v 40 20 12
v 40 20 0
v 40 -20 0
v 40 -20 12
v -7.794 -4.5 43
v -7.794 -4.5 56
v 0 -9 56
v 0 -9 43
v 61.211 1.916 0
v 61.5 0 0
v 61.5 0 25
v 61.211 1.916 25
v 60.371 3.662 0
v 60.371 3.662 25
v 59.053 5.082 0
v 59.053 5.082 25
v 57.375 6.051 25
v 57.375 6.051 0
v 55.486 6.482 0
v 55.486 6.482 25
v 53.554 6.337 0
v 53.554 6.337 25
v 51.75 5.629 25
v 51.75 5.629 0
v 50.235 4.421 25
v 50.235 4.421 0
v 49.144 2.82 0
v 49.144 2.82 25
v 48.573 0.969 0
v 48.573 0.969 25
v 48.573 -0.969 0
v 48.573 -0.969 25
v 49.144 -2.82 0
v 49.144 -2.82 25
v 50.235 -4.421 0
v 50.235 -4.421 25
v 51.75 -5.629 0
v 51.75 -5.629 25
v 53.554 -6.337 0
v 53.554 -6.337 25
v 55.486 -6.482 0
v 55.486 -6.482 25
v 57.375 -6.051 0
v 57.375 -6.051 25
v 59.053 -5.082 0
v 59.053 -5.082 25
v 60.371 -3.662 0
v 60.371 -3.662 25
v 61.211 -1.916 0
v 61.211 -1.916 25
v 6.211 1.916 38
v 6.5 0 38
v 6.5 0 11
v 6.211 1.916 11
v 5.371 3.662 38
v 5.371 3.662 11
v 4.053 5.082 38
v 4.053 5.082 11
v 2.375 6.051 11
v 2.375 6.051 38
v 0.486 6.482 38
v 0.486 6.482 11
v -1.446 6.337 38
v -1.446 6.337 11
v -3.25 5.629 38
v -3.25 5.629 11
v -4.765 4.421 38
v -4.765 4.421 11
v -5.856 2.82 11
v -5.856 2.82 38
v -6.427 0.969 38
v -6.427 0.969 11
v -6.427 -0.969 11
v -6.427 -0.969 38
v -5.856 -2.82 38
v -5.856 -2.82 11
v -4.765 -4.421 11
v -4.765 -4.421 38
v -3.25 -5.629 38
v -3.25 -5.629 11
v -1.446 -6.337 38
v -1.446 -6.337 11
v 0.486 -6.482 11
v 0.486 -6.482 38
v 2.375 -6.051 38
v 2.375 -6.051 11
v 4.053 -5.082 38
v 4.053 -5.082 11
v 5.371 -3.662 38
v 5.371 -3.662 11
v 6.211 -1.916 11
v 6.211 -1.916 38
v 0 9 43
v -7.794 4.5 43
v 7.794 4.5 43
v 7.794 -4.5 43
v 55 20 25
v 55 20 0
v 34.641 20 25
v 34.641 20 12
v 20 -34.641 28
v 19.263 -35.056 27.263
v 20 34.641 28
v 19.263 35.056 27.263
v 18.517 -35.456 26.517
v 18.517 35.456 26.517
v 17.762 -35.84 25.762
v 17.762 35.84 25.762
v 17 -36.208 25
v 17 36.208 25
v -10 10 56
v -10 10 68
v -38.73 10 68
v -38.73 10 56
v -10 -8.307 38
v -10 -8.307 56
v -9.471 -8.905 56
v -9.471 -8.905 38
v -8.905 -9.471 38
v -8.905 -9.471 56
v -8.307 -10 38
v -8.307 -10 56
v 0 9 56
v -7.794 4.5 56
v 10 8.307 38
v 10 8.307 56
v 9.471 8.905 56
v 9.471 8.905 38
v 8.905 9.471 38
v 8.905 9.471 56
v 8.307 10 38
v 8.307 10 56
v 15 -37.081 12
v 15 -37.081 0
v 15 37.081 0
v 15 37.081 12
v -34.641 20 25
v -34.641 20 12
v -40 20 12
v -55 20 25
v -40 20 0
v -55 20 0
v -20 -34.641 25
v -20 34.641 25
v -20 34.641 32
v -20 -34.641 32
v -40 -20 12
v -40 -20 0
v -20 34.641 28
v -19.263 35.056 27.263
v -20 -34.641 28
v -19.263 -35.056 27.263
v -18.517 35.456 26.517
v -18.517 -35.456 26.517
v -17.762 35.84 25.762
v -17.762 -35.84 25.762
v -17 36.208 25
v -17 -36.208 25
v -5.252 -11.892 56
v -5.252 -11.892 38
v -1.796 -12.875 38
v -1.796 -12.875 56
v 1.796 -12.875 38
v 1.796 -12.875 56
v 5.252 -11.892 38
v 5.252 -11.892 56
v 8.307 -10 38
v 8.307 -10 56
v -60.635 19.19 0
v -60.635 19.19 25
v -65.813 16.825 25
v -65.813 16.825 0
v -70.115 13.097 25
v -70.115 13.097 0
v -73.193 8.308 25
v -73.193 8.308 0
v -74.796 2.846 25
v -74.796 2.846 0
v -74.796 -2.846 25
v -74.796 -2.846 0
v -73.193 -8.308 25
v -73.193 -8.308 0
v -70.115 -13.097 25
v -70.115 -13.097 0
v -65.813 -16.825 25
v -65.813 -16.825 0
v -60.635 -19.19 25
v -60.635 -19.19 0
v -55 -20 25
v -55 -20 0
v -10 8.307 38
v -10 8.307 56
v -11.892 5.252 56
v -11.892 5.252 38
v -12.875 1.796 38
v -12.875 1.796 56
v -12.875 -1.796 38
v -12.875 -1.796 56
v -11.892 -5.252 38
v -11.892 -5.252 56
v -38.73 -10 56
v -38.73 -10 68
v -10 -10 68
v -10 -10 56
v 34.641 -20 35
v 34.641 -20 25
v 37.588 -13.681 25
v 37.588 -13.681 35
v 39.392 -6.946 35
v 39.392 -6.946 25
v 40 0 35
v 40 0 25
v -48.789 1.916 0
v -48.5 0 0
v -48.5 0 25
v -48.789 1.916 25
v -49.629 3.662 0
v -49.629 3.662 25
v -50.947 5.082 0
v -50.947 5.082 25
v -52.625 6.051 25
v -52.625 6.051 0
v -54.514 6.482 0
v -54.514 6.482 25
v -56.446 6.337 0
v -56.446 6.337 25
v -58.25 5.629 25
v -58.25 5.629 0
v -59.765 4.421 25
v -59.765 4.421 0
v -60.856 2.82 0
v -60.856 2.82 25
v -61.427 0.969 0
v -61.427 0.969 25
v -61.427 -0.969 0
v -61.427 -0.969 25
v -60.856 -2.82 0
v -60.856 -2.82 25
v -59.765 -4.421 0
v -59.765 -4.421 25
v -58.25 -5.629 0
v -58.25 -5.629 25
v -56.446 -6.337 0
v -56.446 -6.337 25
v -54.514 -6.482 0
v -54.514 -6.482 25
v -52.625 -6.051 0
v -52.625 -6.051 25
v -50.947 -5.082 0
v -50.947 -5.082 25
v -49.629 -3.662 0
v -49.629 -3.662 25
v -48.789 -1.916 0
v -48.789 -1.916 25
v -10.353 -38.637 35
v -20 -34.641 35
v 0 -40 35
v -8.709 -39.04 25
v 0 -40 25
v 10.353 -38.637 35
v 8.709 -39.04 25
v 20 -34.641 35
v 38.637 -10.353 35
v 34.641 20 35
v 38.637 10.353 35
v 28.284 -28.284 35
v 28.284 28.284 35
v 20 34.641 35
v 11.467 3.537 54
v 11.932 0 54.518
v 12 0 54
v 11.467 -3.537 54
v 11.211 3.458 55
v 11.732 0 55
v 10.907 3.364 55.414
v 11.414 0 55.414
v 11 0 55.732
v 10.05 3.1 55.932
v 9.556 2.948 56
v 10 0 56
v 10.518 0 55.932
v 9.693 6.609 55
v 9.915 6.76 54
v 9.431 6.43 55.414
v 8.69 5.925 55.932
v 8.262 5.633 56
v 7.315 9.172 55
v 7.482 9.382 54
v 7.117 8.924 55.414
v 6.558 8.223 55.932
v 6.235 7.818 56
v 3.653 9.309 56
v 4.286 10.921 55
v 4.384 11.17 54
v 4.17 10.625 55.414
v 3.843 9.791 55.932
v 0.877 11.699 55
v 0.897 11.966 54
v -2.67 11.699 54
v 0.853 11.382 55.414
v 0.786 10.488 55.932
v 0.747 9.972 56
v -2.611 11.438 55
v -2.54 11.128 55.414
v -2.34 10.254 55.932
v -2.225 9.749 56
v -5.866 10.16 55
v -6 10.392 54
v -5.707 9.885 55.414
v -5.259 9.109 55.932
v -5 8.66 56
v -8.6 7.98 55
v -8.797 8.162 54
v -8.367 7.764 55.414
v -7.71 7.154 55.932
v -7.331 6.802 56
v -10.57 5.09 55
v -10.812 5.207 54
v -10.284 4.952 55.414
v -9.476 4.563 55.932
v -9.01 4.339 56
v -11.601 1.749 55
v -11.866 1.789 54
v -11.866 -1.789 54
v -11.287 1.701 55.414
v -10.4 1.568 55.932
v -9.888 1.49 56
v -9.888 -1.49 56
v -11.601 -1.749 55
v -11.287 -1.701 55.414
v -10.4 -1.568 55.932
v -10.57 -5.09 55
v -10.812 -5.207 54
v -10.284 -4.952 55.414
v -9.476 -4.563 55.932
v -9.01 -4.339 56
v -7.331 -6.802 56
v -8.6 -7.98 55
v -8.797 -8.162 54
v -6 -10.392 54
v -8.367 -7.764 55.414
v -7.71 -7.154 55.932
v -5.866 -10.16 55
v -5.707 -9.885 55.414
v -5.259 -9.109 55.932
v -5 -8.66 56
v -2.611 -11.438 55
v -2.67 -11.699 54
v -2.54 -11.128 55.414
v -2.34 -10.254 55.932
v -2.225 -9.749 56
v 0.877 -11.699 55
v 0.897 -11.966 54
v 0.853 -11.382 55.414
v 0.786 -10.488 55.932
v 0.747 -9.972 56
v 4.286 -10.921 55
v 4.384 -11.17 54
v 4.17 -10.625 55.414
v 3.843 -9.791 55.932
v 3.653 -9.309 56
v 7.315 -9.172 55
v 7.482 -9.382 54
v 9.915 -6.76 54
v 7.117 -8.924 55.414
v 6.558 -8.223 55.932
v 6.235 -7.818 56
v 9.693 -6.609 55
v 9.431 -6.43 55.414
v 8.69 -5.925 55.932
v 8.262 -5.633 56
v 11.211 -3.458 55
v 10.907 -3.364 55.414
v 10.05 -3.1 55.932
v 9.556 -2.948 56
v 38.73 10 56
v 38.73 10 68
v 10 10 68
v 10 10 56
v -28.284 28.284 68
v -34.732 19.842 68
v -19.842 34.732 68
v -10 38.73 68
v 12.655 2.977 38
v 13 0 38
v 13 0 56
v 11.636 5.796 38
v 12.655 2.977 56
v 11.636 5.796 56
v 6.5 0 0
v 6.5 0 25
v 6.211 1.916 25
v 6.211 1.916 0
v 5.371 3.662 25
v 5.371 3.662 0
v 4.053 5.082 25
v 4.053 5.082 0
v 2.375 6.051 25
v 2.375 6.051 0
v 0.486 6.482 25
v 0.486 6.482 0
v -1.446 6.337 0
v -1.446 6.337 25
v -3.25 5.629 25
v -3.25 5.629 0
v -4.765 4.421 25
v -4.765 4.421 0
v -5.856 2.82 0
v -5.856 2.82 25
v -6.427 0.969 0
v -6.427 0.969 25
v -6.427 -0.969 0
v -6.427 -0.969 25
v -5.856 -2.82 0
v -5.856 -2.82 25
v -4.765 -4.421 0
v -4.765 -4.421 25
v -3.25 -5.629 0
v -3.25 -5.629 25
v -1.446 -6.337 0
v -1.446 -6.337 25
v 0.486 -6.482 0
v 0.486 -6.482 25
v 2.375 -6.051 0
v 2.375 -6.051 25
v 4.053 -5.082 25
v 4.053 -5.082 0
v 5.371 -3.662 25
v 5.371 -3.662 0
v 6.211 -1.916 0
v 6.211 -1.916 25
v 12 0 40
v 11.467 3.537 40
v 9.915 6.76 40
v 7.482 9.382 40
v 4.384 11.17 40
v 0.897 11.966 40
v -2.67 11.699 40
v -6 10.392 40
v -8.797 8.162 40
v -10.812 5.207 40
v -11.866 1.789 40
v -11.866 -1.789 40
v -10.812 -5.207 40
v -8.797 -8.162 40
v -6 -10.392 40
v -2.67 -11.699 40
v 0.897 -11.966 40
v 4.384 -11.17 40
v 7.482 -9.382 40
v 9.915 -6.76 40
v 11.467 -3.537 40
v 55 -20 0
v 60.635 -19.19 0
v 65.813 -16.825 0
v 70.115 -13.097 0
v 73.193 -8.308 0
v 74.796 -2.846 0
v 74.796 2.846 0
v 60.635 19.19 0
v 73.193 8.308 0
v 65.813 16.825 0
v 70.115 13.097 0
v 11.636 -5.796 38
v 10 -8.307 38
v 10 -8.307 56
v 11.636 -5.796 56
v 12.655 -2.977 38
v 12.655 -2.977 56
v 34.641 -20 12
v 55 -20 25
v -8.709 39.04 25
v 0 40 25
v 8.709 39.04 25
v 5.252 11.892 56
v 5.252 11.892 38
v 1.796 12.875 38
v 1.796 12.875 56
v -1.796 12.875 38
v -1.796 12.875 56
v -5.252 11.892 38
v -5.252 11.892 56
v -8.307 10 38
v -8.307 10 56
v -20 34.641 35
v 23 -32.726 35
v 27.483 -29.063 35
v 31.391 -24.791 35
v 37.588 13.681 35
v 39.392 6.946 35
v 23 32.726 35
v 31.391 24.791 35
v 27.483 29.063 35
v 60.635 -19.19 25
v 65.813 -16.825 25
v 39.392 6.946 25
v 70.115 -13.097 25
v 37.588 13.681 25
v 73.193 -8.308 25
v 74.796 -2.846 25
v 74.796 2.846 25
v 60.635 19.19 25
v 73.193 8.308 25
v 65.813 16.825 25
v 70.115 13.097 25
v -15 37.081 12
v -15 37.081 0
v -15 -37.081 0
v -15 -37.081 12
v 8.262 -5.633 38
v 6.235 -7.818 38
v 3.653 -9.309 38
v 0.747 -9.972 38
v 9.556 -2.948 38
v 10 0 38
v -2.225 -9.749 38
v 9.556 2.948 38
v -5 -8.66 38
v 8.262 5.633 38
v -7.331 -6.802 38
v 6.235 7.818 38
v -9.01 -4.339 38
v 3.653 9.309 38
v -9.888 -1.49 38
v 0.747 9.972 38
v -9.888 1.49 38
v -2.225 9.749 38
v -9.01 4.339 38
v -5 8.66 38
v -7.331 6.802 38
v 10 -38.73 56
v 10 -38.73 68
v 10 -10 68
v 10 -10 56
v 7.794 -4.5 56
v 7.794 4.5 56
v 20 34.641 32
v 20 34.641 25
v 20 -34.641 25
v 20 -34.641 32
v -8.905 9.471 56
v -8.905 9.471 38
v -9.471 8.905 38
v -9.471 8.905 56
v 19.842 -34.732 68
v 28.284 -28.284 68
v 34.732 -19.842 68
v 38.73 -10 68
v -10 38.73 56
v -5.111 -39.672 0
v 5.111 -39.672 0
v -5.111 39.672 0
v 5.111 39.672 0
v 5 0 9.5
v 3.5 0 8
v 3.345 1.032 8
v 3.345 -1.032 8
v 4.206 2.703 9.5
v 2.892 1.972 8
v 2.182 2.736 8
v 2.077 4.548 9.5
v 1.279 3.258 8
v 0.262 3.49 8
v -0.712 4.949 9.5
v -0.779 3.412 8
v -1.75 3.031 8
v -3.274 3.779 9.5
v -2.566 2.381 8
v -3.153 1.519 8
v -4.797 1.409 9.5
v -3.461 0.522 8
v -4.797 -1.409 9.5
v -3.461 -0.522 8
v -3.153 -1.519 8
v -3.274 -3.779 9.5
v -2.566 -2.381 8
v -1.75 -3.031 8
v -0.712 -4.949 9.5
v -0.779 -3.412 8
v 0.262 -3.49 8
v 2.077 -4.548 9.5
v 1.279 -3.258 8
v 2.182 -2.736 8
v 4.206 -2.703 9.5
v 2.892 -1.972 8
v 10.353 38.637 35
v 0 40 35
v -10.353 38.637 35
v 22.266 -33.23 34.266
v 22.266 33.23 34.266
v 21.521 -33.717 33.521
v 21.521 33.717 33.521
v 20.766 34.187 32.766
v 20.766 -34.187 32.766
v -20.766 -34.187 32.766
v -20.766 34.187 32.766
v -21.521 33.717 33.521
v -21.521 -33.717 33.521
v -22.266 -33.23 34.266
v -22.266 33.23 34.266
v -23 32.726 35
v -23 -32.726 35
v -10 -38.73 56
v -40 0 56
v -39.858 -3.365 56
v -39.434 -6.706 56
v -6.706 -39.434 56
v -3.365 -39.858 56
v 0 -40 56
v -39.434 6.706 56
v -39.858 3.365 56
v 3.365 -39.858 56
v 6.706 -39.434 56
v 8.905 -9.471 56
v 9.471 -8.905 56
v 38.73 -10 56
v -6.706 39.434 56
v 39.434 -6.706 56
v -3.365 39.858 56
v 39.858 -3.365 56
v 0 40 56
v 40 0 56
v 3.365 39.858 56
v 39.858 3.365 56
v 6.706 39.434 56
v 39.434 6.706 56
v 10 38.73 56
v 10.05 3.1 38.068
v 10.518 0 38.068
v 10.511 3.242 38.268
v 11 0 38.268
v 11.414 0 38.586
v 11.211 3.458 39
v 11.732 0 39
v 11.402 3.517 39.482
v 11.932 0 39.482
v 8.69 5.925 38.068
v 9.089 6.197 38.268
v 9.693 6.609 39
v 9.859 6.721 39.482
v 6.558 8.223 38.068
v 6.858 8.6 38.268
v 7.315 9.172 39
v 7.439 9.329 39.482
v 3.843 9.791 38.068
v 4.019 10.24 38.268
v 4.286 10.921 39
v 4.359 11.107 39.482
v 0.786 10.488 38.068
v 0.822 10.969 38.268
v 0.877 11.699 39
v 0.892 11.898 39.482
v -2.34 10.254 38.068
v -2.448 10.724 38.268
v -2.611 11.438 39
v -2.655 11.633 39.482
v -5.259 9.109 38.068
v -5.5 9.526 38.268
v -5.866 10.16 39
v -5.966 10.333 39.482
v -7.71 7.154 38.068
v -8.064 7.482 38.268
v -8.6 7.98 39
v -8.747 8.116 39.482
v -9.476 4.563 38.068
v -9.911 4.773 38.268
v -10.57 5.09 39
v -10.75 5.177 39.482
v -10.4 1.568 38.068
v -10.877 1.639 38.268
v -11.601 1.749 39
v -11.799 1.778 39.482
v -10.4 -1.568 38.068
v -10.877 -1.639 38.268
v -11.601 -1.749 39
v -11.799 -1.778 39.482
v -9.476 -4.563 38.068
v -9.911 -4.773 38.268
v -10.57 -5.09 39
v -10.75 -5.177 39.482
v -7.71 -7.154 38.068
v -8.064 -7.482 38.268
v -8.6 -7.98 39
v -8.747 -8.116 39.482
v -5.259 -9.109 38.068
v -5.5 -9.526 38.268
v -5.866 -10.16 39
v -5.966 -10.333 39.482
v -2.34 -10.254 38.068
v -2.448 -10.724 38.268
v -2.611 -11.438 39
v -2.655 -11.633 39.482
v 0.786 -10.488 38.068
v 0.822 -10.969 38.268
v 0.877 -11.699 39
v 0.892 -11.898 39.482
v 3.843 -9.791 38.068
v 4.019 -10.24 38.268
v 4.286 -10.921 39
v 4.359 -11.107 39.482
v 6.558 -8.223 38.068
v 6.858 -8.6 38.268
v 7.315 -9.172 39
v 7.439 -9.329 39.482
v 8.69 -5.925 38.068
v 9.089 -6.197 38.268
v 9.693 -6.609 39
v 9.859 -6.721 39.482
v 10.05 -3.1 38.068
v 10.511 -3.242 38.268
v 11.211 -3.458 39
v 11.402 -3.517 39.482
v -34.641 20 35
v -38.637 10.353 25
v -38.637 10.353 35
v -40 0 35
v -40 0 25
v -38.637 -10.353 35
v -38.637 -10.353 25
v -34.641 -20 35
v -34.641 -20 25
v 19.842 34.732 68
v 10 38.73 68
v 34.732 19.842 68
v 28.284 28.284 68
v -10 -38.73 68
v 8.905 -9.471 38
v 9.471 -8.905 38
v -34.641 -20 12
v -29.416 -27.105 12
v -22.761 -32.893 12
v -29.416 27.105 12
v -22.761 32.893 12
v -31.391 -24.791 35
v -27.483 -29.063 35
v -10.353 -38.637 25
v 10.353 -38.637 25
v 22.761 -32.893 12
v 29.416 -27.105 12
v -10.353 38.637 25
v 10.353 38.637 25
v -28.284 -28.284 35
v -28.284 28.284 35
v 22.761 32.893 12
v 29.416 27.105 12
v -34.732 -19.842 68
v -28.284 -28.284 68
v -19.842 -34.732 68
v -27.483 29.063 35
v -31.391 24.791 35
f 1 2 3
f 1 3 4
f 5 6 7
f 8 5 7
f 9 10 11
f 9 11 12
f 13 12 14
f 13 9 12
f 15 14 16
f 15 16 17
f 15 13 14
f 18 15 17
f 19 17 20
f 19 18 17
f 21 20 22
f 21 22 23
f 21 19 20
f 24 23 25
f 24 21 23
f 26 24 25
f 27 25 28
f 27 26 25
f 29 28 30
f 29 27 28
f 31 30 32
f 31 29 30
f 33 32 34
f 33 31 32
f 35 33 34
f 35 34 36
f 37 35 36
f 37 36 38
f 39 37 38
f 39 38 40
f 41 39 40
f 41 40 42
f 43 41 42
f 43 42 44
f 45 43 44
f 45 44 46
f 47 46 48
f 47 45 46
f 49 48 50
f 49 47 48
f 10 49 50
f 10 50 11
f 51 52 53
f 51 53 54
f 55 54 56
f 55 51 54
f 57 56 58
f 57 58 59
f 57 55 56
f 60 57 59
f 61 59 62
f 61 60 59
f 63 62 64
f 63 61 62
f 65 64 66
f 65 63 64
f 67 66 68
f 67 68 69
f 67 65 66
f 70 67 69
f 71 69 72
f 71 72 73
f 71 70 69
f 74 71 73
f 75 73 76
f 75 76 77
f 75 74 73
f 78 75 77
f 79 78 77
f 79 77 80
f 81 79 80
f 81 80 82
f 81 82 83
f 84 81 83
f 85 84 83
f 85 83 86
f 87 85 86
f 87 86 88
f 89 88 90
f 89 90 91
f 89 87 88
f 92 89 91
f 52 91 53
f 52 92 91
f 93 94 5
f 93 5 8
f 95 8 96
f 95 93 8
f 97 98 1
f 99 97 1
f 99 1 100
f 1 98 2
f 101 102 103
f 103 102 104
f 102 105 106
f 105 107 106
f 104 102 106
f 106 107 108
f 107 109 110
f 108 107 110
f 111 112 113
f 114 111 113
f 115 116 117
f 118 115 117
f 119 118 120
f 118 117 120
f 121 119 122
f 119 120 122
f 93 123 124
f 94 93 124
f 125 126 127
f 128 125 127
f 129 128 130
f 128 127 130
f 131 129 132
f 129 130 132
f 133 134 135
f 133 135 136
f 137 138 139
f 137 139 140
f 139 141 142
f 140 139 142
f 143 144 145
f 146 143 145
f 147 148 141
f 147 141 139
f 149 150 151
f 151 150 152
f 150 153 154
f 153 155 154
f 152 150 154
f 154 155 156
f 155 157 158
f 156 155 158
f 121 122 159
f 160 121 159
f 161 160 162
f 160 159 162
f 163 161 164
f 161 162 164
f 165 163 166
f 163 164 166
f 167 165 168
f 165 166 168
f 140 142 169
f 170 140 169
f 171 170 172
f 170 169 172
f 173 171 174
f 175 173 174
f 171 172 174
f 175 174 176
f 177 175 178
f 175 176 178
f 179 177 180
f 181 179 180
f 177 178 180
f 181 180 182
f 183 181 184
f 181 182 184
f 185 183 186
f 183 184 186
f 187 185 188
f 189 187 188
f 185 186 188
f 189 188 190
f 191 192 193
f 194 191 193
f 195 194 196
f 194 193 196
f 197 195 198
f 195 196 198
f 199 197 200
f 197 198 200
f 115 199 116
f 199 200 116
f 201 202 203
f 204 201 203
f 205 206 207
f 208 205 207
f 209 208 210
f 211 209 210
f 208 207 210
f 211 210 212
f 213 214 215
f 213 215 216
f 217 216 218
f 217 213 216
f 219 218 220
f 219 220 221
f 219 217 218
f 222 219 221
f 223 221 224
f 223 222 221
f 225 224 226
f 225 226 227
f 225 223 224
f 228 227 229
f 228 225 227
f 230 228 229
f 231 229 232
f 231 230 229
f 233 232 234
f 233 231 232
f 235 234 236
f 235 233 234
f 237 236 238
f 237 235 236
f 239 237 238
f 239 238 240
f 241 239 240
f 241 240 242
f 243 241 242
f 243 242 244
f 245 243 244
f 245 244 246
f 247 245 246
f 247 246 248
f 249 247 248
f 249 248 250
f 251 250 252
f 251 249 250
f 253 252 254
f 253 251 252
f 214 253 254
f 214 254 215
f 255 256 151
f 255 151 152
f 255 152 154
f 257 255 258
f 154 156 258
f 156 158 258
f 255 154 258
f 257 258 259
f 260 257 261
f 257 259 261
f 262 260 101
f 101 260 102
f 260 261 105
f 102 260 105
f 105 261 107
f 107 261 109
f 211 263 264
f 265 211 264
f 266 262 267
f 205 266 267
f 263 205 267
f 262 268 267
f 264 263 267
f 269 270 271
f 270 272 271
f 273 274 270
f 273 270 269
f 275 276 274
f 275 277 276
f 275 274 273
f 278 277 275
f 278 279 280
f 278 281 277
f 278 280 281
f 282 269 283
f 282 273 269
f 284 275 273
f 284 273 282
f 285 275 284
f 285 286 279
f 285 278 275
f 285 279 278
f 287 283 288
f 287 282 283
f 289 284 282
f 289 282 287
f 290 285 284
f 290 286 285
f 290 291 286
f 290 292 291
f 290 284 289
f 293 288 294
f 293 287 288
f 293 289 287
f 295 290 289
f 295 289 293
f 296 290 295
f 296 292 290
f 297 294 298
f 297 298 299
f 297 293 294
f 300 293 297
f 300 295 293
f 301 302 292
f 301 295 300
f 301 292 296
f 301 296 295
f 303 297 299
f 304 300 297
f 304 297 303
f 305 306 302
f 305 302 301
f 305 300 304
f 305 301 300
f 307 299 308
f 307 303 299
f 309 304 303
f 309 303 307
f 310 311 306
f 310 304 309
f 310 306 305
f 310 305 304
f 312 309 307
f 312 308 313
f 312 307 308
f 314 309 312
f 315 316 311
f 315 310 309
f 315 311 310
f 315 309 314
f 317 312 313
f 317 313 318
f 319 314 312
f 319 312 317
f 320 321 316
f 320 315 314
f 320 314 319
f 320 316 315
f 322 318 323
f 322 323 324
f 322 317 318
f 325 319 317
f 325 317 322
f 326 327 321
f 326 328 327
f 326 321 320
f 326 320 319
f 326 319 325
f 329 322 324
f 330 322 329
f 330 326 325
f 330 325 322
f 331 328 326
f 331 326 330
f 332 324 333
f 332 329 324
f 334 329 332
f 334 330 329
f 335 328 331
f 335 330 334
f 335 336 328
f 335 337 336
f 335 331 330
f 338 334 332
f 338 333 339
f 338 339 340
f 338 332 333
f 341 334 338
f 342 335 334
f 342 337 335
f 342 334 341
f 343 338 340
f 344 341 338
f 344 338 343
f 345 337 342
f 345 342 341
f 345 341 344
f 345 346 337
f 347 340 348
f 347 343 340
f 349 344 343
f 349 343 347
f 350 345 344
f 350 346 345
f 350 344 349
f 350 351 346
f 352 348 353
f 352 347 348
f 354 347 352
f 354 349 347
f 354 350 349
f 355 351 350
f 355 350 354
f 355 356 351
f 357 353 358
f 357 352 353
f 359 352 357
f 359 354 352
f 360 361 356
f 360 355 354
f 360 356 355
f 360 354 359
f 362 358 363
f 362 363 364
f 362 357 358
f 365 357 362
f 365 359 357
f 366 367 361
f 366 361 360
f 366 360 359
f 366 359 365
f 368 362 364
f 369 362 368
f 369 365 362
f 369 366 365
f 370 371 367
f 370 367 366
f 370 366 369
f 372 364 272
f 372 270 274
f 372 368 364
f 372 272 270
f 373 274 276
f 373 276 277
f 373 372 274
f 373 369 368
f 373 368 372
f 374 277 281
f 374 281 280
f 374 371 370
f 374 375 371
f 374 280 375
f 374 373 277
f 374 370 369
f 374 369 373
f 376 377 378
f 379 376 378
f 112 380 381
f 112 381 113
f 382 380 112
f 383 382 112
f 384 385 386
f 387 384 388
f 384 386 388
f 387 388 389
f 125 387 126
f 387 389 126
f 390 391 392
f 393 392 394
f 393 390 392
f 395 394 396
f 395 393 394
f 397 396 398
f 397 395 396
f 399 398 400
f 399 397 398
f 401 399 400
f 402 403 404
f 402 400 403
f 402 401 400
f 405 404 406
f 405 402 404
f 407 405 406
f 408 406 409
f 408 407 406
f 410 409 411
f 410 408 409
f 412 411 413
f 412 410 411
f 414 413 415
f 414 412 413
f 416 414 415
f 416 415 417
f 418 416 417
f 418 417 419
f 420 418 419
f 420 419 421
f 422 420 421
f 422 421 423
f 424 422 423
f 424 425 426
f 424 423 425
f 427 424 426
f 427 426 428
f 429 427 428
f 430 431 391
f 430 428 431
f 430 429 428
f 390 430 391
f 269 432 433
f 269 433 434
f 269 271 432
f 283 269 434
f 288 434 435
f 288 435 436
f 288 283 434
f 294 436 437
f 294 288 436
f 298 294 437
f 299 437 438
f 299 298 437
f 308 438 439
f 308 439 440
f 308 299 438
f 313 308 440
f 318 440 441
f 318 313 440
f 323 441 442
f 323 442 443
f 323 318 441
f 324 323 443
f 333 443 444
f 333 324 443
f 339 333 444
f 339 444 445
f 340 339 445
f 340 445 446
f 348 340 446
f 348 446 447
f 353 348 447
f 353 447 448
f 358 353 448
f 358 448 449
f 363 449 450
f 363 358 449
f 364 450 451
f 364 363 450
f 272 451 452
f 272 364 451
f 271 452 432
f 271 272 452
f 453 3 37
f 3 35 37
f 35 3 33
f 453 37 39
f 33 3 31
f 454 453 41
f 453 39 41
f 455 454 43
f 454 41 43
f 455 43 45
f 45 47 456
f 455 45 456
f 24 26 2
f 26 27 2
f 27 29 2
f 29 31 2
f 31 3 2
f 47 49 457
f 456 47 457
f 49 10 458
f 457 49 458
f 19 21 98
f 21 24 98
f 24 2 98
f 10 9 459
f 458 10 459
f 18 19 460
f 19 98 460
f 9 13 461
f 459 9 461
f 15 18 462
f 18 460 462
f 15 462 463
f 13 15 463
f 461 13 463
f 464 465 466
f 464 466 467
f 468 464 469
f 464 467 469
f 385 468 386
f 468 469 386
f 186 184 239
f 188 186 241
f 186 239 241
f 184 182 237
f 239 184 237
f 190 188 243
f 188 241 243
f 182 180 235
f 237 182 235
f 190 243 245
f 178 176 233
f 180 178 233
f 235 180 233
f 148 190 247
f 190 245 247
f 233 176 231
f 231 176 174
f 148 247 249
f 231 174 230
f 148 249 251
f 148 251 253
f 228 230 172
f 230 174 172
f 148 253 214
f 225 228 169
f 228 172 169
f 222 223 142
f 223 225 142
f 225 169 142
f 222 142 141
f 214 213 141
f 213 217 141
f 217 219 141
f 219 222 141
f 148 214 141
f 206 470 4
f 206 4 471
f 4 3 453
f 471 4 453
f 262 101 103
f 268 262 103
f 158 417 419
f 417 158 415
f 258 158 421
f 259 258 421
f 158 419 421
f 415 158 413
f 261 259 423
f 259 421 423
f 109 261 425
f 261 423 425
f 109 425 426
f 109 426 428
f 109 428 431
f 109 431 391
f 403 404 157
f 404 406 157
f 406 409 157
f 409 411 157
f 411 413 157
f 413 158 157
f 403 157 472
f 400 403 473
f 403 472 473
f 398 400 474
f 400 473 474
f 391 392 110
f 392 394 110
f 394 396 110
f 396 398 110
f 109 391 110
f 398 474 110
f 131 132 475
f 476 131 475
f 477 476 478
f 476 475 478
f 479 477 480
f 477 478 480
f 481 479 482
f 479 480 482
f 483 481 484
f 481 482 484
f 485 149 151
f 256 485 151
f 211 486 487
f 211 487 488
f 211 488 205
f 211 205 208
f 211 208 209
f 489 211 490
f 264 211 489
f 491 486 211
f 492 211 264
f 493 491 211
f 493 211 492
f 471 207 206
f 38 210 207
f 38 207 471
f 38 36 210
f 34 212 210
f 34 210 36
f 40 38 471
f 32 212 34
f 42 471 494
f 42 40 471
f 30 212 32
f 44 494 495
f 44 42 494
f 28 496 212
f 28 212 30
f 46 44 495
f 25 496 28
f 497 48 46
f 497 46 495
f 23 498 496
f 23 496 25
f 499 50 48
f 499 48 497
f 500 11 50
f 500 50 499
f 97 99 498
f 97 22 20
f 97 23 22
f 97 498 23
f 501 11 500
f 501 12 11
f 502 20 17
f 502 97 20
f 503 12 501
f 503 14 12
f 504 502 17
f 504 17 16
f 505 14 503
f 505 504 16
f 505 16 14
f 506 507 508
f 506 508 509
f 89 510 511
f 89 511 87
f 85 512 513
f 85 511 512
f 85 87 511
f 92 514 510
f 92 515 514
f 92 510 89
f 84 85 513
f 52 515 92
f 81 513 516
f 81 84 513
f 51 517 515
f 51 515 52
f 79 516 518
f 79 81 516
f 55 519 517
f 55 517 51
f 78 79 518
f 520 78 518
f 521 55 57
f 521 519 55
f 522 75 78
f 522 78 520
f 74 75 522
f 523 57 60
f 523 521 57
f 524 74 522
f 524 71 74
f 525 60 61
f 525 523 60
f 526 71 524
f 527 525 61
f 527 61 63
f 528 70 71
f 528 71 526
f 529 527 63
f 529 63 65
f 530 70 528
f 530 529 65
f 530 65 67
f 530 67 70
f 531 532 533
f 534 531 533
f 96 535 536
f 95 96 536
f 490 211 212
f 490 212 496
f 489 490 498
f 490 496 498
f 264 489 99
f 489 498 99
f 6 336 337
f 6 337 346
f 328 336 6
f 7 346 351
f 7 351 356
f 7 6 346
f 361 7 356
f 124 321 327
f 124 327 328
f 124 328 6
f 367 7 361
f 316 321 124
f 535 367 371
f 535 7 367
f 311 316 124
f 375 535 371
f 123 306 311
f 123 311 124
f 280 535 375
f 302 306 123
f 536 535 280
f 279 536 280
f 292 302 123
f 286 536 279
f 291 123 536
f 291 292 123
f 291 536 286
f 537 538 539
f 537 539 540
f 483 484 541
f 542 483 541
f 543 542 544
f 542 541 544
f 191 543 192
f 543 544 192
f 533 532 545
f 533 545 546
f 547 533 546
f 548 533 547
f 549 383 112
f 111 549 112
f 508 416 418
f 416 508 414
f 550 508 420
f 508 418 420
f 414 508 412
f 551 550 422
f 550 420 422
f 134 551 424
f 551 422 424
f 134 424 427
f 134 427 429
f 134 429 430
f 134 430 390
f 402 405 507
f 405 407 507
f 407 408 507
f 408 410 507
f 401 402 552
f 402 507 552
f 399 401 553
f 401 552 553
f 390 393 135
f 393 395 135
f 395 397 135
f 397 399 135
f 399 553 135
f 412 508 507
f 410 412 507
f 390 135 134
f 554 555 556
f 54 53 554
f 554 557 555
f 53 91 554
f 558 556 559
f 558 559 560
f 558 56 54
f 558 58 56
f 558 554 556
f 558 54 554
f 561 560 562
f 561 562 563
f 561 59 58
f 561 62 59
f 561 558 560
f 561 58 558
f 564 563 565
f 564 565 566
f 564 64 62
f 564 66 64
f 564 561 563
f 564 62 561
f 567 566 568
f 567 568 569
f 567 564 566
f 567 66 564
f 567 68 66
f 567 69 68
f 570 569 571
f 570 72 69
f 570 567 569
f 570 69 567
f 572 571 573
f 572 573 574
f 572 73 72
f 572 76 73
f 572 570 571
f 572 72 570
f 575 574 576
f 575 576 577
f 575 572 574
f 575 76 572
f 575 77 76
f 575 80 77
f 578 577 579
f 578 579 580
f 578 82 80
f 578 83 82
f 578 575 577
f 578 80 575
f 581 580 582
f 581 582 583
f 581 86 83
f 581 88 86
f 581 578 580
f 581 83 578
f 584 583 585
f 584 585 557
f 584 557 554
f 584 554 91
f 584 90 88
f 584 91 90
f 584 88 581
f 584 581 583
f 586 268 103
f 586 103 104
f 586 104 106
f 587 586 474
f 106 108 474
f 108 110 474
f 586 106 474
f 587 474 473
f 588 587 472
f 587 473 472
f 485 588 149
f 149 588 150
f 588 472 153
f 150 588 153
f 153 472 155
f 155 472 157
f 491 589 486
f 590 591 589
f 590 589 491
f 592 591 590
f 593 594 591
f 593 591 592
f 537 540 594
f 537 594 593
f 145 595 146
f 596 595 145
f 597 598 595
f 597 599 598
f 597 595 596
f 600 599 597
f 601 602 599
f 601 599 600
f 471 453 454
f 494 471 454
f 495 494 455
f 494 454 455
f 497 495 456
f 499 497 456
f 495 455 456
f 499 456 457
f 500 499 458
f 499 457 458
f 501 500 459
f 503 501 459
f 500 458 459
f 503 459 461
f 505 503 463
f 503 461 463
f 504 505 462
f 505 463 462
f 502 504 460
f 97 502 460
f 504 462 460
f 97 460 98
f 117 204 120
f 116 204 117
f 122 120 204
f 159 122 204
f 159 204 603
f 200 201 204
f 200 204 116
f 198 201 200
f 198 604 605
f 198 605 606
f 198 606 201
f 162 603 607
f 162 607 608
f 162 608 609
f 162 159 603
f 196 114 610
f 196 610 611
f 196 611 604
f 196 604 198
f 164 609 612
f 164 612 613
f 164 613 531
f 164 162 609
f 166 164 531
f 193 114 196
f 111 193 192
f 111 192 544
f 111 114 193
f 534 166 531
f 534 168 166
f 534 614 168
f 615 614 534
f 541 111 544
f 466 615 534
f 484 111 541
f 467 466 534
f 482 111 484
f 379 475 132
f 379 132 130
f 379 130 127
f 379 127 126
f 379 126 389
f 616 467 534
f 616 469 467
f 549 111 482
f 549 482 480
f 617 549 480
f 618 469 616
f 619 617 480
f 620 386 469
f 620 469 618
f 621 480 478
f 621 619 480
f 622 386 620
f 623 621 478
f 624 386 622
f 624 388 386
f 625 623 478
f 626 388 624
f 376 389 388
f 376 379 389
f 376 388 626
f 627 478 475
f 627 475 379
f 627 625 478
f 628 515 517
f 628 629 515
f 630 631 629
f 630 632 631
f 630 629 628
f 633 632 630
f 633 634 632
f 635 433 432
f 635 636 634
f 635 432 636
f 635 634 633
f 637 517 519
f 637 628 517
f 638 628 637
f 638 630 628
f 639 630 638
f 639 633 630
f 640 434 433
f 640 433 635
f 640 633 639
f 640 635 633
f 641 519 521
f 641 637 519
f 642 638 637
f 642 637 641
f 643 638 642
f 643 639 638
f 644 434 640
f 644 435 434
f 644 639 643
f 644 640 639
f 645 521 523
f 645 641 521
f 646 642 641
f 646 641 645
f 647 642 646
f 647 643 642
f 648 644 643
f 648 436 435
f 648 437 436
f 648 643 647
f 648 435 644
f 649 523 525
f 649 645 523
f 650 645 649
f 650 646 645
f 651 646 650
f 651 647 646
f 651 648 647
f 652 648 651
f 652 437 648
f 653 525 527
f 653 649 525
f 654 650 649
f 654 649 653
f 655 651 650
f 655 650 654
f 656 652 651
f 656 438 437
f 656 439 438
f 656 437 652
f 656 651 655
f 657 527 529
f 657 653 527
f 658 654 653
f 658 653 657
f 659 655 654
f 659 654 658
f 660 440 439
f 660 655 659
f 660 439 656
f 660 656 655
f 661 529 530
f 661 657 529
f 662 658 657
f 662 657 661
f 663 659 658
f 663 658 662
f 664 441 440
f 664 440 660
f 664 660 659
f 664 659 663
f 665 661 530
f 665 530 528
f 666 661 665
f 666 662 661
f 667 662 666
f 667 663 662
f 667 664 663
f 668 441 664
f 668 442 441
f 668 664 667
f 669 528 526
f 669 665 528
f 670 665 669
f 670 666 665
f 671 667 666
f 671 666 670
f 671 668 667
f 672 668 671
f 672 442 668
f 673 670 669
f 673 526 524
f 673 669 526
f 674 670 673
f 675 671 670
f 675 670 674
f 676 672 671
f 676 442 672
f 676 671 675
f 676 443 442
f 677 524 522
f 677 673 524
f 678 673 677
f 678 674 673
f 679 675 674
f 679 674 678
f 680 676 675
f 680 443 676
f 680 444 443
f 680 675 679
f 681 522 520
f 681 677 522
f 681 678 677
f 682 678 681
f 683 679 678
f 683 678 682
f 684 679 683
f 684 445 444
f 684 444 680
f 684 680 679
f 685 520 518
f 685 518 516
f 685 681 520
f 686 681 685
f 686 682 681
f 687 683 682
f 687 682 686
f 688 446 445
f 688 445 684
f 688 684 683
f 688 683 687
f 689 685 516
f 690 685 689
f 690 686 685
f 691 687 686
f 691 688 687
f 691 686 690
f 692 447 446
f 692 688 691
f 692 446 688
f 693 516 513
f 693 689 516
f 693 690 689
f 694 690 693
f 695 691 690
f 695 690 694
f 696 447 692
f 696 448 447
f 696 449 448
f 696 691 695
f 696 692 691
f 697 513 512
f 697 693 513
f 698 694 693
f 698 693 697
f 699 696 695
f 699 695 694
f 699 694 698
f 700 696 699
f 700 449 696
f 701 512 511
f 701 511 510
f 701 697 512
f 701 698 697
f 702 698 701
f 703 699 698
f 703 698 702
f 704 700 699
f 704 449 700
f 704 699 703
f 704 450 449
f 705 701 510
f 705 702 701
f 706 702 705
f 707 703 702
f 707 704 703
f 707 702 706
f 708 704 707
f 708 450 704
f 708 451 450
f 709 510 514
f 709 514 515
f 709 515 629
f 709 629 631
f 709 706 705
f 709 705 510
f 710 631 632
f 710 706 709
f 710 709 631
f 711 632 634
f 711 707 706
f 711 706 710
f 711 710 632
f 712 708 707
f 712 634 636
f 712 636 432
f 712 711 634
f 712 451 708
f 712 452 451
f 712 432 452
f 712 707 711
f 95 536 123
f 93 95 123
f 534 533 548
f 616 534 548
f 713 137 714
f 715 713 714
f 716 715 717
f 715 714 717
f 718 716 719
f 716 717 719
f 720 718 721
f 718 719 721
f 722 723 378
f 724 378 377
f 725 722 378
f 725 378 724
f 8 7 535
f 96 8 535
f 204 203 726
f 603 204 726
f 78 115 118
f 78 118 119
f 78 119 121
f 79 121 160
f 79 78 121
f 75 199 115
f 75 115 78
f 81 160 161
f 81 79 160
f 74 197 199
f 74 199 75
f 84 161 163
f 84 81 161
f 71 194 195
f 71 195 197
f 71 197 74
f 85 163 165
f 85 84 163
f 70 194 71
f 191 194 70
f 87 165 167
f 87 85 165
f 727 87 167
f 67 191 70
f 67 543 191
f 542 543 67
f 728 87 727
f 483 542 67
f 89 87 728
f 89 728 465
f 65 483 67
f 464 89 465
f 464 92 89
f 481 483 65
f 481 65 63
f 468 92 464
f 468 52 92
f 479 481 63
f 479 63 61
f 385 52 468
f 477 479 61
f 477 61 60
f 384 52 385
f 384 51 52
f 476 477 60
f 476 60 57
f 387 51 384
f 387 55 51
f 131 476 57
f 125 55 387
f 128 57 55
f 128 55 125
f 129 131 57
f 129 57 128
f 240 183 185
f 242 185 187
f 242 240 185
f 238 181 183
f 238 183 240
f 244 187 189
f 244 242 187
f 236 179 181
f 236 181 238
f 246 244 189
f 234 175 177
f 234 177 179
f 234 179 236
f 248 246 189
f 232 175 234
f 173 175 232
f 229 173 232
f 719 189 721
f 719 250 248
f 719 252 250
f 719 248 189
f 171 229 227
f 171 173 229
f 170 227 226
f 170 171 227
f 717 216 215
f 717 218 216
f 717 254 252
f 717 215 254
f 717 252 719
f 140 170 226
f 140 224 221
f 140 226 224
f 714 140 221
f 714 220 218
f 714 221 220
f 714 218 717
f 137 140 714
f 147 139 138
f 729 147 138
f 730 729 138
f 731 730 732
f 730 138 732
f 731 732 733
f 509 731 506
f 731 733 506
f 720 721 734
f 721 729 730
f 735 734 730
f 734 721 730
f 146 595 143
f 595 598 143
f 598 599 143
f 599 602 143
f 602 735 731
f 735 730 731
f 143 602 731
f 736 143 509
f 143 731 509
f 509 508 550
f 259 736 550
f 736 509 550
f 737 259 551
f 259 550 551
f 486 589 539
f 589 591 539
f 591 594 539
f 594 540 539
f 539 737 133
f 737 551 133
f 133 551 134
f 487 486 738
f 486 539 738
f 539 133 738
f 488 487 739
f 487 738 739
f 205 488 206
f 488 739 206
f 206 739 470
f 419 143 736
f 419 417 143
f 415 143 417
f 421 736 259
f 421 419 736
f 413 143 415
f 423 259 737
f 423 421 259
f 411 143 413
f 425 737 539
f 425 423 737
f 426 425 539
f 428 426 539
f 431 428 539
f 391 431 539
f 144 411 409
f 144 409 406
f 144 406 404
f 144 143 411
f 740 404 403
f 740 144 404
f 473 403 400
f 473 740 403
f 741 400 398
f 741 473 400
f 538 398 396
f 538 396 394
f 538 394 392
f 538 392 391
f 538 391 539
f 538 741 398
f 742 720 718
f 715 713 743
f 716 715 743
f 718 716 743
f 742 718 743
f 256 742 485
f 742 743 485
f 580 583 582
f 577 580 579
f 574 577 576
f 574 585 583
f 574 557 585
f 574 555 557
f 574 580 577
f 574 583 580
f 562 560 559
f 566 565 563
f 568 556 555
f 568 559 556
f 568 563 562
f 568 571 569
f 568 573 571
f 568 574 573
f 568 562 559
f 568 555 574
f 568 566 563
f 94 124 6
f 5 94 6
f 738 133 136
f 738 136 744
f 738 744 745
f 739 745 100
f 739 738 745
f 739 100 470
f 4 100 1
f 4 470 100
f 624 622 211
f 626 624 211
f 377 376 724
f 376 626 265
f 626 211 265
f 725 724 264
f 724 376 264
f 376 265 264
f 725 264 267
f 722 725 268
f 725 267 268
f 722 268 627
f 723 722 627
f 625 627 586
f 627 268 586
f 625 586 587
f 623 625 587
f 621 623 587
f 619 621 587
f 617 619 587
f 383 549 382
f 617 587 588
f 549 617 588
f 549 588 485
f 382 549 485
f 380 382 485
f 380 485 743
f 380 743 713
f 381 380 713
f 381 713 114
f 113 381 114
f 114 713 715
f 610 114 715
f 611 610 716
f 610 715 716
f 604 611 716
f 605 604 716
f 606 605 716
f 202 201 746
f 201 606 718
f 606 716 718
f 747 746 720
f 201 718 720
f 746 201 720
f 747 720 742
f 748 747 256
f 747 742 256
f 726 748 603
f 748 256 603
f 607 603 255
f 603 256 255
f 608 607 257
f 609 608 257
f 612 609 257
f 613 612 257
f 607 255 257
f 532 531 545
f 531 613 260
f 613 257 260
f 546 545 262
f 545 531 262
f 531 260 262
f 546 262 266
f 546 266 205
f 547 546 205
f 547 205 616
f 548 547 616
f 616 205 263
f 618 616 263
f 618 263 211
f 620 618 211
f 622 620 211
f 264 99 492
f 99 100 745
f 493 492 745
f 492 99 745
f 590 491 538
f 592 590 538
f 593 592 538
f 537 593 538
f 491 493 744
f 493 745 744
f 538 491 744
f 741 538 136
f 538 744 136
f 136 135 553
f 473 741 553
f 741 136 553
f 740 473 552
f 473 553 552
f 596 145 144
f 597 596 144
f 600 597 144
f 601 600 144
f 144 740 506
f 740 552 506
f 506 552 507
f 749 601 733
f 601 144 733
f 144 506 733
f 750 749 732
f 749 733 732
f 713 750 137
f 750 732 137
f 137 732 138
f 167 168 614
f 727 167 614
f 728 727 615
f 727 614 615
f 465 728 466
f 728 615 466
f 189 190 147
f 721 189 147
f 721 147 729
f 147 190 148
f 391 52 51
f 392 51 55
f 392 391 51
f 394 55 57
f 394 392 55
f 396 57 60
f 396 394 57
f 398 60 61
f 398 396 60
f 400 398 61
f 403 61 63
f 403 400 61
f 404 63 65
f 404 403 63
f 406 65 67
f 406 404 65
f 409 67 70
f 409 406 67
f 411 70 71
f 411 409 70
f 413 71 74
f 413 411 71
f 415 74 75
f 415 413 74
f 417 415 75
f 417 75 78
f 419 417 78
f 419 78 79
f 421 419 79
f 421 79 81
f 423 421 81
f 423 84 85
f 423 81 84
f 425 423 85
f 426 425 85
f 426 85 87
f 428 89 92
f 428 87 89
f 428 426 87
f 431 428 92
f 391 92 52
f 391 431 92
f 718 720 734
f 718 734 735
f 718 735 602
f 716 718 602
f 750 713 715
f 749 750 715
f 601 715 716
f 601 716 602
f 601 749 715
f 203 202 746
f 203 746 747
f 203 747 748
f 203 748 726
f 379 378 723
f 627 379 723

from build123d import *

# Parameters (mm, degrees)
F0_R      = 6.5
F1_DEPTH  = 35
F2_DEPTH  = 25
F3_W      = 40
F3_H      = 10
F3_W_2    = 25
F3_H_2    = 12
F4_DEPTH  = 50
F5_SIZE   = 3
F6_R      = 6.5
F7_DEPTH  = 10
F8_SIZE   = 3
F9_R      = 40
F10_DEPTH = 33
F12_DEPTH = 30
F13_DEPTH = 12
F14_DEPTH = 33.001
F17_SIZE  = 3
F19_DEPTH = 13


with BuildPart() as f1:
    # F0 (on Top) → F1 (new body)
    with BuildSketch(Plane.XY):
        with BuildLine():
            ThreePointArc((-34.6410161514, -20), (0, -40), (34.6410161514, -20))
            Line((34.6410161514, -20), (-34.6410161514, -20))
        make_face()
        with BuildLine():
            ThreePointArc((34.6410161514, -20), (38.6370330516, -10.3527618041), (40, 0))
            ThreePointArc((40, 0), (38.6370330516, 10.3527618041), (34.6410161514, 20))
            Line((34.6410161514, 20), (-34.6410161514, 20))
            ThreePointArc((-34.6410161514, 20), (-40, 0), (-34.6410161514, -20))
            Line((-34.6410161514, -20), (34.6410161514, -20))
        make_face()
        Circle(F0_R, mode=Mode.SUBTRACT)
        with BuildLine():
            Line((-34.6410161514, 20), (34.6410161514, 20))
            ThreePointArc((34.6410161514, 20), (0, 40), (-34.6410161514, 20))
        make_face()
    extrude(amount=F1_DEPTH)

    # F0 (on Top) → F2 (join)
    with BuildSketch(Plane.XY):
        with BuildLine():
            ThreePointArc((-34.6410161514, -20), (-40, 0), (-34.6410161514, 20))
            Line((-34.6410161514, 20), (-55, 20))
            ThreePointArc((-55, 20), (-75, 0), (-55, -20))
            Line((-55, -20), (-34.6410161514, -20))
        make_face()
        with Locations((-55, 0)):
            Circle(F0_R, mode=Mode.SUBTRACT)
        with BuildLine():
            ThreePointArc((34.6410161514, 20), (38.6370330516, 10.3527618041), (40, 0))
            ThreePointArc((40, 0), (38.6370330516, -10.3527618041), (34.6410161514, -20))
            Line((34.6410161514, -20), (55, -20))
            ThreePointArc((55, -20), (75, 0), (55, 20))
            Line((55, 20), (34.6410161514, 20))
        make_face()
        with Locations((55, 0)):
            Circle(F0_R, mode=Mode.SUBTRACT)
    extrude(amount=F2_DEPTH)

    # F3 (on Front) → F4 (cut, symmetric)
    with BuildSketch(Plane.XZ):
        with Locations((0, 30)):
            Rectangle(F3_W, F3_H)
        with Locations((-27.5, 6)):
            Rectangle(F3_W_2, F3_H_2)
        with Locations((27.5, 6)):
            Rectangle(F3_W_2, F3_H_2)
    extrude(amount=F4_DEPTH, both=True, mode=Mode.SUBTRACT)

    # F5
    f5_edges = [f1.edges().sort_by_distance(p)[0] for p in [
        (-20, 0, 35),
        (20, 0, 35),
    ]]
    chamfer(f5_edges, length=F5_SIZE)


with BuildPart() as f7:
    # F6 (on face) → F7 (new body, through all)
    with BuildSketch(Plane.XY.offset(25)):
        with BuildLine():
            Line((20, -34.6410161514), (20, 34.6410161514))
            ThreePointArc((20, 34.6410161514), (0, 40), (-20, 34.6410161514))
            Line((-20, 34.6410161514), (-20, -34.6410161514))
            ThreePointArc((-20, -34.6410161514), (0, -40), (20, -34.6410161514))
        make_face()
        Circle(F6_R, mode=Mode.SUBTRACT)
    extrude(amount=F7_DEPTH)

    # F8
    f8_edges = [f7.edges().sort_by_distance(p)[0] for p in [
        (20, 0, 25),
        (-20, 0, 25),
    ]]
    chamfer(f8_edges, length=F8_SIZE)

    # F9 (on face) → F10 (join)
    with BuildSketch(Plane.XY.offset(35)):
        Circle(F9_R)
    extrude(amount=F10_DEPTH)

    # F11 (on face) → F12 (cut)
    with BuildSketch(Plane.XY.offset(68)):
        with BuildLine():
            Line((-8.3066238629, 10), (8.3066238629, 10))
            ThreePointArc((8.3066238629, 10), (0, 13), (-8.3066238629, 10))
        make_face()
        with BuildLine():
            Line((10, -8.3066238629), (10, 8.3066238629))
            ThreePointArc((10, 8.3066238629), (9.1923881554, 9.1923881554), (8.3066238629, 10))
            Line((8.3066238629, 10), (-8.3066238629, 10))
            ThreePointArc((-8.3066238629, 10), (-9.1923881554, 9.1923881554), (-10, 8.3066238629))
            Line((-10, 8.3066238629), (-10, -8.3066238629))
            ThreePointArc((-10, -8.3066238629), (-9.1923881554, -9.1923881554), (-8.3066238629, -10))
            Line((-8.3066238629, -10), (8.3066238629, -10))
            ThreePointArc((8.3066238629, -10), (9.1923881554, -9.1923881554), (10, -8.3066238629))
        make_face()
        with BuildLine():
            Line((-10, -8.3066238629), (-10, 8.3066238629))
            ThreePointArc((-10, 8.3066238629), (-13, 0), (-10, -8.3066238629))
        make_face()
        with BuildLine():
            ThreePointArc((-8.3066238629, -10), (0, -13), (8.3066238629, -10))
            Line((8.3066238629, -10), (-8.3066238629, -10))
        make_face()
        with BuildLine():
            ThreePointArc((10, -8.3066238629), (12.2270192606, -4.4158804332), (13, 0))
            ThreePointArc((13, 0), (12.2270192606, 4.4158804332), (10, 8.3066238629))
            Line((10, 8.3066238629), (10, -8.3066238629))
        make_face()
    extrude(amount=-F12_DEPTH, mode=Mode.SUBTRACT)

    # F11 (on face) → F13 (cut)
    with BuildSketch(Plane.XY.offset(68)):
        with BuildLine():
            ThreePointArc((-8.3066238629, 10), (0, 13), (8.3066238629, 10))
            Line((8.3066238629, 10), (10, 10))
            Line((10, 10), (10, 38.7298334621))
            ThreePointArc((10, 38.7298334621), (5.0401716969, 39.681187851), (-4.8e-09, 40))
            ThreePointArc((-4.8e-09, 40), (-5.0401717017, 39.6811878504), (-10, 38.7298334621))
            Line((-10, 38.7298334621), (-10, 10))
            Line((-10, 10), (-8.3066238629, 10))
        make_face()
        with BuildLine():
            ThreePointArc((-10, -8.3066238629), (-13, 0), (-10, 8.3066238629))
            Line((-10, 8.3066238629), (-10, 10))
            Line((-10, 10), (-38.7298334621, 10))
            ThreePointArc((-38.7298334621, 10), (-39.6811878507, 5.0401716993), (-40, 0))
            ThreePointArc((-40, 0), (-39.6811878507, -5.0401716993), (-38.7298334621, -10))
            Line((-38.7298334621, -10), (-10, -10))
            Line((-10, -10), (-10, -8.3066238629))
        make_face()
        with BuildLine():
            ThreePointArc((-10, 8.3066238629), (-9.1923881554, 9.1923881554), (-8.3066238629, 10))
            Line((-8.3066238629, 10), (-10, 10))
            Line((-10, 10), (-10, 8.3066238629))
        make_face()
        with BuildLine():
            ThreePointArc((8.3066238629, 10), (9.1923881554, 9.1923881554), (10, 8.3066238629))
            Line((10, 8.3066238629), (10, 10))
            Line((10, 10), (8.3066238629, 10))
        make_face()
        with BuildLine():
            ThreePointArc((10, 8.3066238629), (12.2270192606, 4.4158804332), (13, 0))
            ThreePointArc((13, 0), (12.2270192606, -4.4158804332), (10, -8.3066238629))
            Line((10, -8.3066238629), (10, -10))
            Line((10, -10), (38.7298334621, -10))
            ThreePointArc((38.7298334621, -10), (39.6811878507, -5.0401716993), (40, 0))
            ThreePointArc((40, 0), (39.6811878507, 5.0401716993), (38.7298334621, 10))
            Line((38.7298334621, 10), (10, 10))
            Line((10, 10), (10, 8.3066238629))
        make_face()
        with BuildLine():
            Line((10, -10), (10, -8.3066238629))
            ThreePointArc((10, -8.3066238629), (9.1923881554, -9.1923881554), (8.3066238629, -10))
            Line((8.3066238629, -10), (10, -10))
        make_face()
        with BuildLine():
            Line((10, -10), (8.3066238629, -10))
            ThreePointArc((8.3066238629, -10), (0, -13), (-8.3066238629, -10))
            Line((-8.3066238629, -10), (-10, -10))
            Line((-10, -10), (-10, -38.7298334621))
            ThreePointArc((-10, -38.7298334621), (-5.0401716993, -39.6811878507), (0, -40))
            ThreePointArc((0, -40), (5.0401716993, -39.6811878507), (10, -38.7298334621))
            Line((10, -38.7298334621), (10, -10))
        make_face()
        with BuildLine():
            Line((-10, -10), (-8.3066238629, -10))
            ThreePointArc((-8.3066238629, -10), (-9.1923881554, -9.1923881554), (-10, -8.3066238629))
            Line((-10, -8.3066238629), (-10, -10))
        make_face()
    extrude(amount=-F13_DEPTH, mode=Mode.SUBTRACT)

    # F14 (cut, through all): a face of the model
    f14_faces = [f7.faces().sort_by_distance(p)[0] for p in [
        (0, 0, 35),
    ]]
    extrude(f14_faces, amount=-F14_DEPTH, mode=Mode.SUBTRACT)


with BuildPart() as f16:
    # F15 (on Front) → F16 (revolve)
    with BuildSketch(Plane.XZ):
        with BuildLine():
            Line((10, 56), (0, 56))
            Line((0, 56), (0, 8))
            Line((0, 8), (6.5, 8))
            Line((6.5, 8), (6.5, 38))
            Line((6.5, 38), (10, 38))
            ThreePointArc((10, 38), (11.4142135624, 38.5857864376), (12, 40))
            Line((12, 40), (12, 54))
            ThreePointArc((12, 54), (11.4142135624, 55.4142135624), (10, 56))
        make_face()
    revolve(axis=Axis((0, 0, 32), (0, 0, 1)))

    # F17
    f17_edges = [f16.edges().sort_by_distance(p)[0] for p in [
        (-6.5, 0, 8),
    ]]
    chamfer(f17_edges, length=F17_SIZE)

    # F18 (on face) → F19 (cut)
    with BuildSketch(Plane.XY.offset(56)):
        Polygon((7.7942286341, -4.5), (7.7942286341, 4.5), (0, 9), (-7.7942286341, 4.5), (-7.7942286341, -4.5), (0, -9), align=None)
    extrude(amount=-F19_DEPTH, mode=Mode.SUBTRACT)


solid = Compound([f1.part, f7.part, f16.part])
